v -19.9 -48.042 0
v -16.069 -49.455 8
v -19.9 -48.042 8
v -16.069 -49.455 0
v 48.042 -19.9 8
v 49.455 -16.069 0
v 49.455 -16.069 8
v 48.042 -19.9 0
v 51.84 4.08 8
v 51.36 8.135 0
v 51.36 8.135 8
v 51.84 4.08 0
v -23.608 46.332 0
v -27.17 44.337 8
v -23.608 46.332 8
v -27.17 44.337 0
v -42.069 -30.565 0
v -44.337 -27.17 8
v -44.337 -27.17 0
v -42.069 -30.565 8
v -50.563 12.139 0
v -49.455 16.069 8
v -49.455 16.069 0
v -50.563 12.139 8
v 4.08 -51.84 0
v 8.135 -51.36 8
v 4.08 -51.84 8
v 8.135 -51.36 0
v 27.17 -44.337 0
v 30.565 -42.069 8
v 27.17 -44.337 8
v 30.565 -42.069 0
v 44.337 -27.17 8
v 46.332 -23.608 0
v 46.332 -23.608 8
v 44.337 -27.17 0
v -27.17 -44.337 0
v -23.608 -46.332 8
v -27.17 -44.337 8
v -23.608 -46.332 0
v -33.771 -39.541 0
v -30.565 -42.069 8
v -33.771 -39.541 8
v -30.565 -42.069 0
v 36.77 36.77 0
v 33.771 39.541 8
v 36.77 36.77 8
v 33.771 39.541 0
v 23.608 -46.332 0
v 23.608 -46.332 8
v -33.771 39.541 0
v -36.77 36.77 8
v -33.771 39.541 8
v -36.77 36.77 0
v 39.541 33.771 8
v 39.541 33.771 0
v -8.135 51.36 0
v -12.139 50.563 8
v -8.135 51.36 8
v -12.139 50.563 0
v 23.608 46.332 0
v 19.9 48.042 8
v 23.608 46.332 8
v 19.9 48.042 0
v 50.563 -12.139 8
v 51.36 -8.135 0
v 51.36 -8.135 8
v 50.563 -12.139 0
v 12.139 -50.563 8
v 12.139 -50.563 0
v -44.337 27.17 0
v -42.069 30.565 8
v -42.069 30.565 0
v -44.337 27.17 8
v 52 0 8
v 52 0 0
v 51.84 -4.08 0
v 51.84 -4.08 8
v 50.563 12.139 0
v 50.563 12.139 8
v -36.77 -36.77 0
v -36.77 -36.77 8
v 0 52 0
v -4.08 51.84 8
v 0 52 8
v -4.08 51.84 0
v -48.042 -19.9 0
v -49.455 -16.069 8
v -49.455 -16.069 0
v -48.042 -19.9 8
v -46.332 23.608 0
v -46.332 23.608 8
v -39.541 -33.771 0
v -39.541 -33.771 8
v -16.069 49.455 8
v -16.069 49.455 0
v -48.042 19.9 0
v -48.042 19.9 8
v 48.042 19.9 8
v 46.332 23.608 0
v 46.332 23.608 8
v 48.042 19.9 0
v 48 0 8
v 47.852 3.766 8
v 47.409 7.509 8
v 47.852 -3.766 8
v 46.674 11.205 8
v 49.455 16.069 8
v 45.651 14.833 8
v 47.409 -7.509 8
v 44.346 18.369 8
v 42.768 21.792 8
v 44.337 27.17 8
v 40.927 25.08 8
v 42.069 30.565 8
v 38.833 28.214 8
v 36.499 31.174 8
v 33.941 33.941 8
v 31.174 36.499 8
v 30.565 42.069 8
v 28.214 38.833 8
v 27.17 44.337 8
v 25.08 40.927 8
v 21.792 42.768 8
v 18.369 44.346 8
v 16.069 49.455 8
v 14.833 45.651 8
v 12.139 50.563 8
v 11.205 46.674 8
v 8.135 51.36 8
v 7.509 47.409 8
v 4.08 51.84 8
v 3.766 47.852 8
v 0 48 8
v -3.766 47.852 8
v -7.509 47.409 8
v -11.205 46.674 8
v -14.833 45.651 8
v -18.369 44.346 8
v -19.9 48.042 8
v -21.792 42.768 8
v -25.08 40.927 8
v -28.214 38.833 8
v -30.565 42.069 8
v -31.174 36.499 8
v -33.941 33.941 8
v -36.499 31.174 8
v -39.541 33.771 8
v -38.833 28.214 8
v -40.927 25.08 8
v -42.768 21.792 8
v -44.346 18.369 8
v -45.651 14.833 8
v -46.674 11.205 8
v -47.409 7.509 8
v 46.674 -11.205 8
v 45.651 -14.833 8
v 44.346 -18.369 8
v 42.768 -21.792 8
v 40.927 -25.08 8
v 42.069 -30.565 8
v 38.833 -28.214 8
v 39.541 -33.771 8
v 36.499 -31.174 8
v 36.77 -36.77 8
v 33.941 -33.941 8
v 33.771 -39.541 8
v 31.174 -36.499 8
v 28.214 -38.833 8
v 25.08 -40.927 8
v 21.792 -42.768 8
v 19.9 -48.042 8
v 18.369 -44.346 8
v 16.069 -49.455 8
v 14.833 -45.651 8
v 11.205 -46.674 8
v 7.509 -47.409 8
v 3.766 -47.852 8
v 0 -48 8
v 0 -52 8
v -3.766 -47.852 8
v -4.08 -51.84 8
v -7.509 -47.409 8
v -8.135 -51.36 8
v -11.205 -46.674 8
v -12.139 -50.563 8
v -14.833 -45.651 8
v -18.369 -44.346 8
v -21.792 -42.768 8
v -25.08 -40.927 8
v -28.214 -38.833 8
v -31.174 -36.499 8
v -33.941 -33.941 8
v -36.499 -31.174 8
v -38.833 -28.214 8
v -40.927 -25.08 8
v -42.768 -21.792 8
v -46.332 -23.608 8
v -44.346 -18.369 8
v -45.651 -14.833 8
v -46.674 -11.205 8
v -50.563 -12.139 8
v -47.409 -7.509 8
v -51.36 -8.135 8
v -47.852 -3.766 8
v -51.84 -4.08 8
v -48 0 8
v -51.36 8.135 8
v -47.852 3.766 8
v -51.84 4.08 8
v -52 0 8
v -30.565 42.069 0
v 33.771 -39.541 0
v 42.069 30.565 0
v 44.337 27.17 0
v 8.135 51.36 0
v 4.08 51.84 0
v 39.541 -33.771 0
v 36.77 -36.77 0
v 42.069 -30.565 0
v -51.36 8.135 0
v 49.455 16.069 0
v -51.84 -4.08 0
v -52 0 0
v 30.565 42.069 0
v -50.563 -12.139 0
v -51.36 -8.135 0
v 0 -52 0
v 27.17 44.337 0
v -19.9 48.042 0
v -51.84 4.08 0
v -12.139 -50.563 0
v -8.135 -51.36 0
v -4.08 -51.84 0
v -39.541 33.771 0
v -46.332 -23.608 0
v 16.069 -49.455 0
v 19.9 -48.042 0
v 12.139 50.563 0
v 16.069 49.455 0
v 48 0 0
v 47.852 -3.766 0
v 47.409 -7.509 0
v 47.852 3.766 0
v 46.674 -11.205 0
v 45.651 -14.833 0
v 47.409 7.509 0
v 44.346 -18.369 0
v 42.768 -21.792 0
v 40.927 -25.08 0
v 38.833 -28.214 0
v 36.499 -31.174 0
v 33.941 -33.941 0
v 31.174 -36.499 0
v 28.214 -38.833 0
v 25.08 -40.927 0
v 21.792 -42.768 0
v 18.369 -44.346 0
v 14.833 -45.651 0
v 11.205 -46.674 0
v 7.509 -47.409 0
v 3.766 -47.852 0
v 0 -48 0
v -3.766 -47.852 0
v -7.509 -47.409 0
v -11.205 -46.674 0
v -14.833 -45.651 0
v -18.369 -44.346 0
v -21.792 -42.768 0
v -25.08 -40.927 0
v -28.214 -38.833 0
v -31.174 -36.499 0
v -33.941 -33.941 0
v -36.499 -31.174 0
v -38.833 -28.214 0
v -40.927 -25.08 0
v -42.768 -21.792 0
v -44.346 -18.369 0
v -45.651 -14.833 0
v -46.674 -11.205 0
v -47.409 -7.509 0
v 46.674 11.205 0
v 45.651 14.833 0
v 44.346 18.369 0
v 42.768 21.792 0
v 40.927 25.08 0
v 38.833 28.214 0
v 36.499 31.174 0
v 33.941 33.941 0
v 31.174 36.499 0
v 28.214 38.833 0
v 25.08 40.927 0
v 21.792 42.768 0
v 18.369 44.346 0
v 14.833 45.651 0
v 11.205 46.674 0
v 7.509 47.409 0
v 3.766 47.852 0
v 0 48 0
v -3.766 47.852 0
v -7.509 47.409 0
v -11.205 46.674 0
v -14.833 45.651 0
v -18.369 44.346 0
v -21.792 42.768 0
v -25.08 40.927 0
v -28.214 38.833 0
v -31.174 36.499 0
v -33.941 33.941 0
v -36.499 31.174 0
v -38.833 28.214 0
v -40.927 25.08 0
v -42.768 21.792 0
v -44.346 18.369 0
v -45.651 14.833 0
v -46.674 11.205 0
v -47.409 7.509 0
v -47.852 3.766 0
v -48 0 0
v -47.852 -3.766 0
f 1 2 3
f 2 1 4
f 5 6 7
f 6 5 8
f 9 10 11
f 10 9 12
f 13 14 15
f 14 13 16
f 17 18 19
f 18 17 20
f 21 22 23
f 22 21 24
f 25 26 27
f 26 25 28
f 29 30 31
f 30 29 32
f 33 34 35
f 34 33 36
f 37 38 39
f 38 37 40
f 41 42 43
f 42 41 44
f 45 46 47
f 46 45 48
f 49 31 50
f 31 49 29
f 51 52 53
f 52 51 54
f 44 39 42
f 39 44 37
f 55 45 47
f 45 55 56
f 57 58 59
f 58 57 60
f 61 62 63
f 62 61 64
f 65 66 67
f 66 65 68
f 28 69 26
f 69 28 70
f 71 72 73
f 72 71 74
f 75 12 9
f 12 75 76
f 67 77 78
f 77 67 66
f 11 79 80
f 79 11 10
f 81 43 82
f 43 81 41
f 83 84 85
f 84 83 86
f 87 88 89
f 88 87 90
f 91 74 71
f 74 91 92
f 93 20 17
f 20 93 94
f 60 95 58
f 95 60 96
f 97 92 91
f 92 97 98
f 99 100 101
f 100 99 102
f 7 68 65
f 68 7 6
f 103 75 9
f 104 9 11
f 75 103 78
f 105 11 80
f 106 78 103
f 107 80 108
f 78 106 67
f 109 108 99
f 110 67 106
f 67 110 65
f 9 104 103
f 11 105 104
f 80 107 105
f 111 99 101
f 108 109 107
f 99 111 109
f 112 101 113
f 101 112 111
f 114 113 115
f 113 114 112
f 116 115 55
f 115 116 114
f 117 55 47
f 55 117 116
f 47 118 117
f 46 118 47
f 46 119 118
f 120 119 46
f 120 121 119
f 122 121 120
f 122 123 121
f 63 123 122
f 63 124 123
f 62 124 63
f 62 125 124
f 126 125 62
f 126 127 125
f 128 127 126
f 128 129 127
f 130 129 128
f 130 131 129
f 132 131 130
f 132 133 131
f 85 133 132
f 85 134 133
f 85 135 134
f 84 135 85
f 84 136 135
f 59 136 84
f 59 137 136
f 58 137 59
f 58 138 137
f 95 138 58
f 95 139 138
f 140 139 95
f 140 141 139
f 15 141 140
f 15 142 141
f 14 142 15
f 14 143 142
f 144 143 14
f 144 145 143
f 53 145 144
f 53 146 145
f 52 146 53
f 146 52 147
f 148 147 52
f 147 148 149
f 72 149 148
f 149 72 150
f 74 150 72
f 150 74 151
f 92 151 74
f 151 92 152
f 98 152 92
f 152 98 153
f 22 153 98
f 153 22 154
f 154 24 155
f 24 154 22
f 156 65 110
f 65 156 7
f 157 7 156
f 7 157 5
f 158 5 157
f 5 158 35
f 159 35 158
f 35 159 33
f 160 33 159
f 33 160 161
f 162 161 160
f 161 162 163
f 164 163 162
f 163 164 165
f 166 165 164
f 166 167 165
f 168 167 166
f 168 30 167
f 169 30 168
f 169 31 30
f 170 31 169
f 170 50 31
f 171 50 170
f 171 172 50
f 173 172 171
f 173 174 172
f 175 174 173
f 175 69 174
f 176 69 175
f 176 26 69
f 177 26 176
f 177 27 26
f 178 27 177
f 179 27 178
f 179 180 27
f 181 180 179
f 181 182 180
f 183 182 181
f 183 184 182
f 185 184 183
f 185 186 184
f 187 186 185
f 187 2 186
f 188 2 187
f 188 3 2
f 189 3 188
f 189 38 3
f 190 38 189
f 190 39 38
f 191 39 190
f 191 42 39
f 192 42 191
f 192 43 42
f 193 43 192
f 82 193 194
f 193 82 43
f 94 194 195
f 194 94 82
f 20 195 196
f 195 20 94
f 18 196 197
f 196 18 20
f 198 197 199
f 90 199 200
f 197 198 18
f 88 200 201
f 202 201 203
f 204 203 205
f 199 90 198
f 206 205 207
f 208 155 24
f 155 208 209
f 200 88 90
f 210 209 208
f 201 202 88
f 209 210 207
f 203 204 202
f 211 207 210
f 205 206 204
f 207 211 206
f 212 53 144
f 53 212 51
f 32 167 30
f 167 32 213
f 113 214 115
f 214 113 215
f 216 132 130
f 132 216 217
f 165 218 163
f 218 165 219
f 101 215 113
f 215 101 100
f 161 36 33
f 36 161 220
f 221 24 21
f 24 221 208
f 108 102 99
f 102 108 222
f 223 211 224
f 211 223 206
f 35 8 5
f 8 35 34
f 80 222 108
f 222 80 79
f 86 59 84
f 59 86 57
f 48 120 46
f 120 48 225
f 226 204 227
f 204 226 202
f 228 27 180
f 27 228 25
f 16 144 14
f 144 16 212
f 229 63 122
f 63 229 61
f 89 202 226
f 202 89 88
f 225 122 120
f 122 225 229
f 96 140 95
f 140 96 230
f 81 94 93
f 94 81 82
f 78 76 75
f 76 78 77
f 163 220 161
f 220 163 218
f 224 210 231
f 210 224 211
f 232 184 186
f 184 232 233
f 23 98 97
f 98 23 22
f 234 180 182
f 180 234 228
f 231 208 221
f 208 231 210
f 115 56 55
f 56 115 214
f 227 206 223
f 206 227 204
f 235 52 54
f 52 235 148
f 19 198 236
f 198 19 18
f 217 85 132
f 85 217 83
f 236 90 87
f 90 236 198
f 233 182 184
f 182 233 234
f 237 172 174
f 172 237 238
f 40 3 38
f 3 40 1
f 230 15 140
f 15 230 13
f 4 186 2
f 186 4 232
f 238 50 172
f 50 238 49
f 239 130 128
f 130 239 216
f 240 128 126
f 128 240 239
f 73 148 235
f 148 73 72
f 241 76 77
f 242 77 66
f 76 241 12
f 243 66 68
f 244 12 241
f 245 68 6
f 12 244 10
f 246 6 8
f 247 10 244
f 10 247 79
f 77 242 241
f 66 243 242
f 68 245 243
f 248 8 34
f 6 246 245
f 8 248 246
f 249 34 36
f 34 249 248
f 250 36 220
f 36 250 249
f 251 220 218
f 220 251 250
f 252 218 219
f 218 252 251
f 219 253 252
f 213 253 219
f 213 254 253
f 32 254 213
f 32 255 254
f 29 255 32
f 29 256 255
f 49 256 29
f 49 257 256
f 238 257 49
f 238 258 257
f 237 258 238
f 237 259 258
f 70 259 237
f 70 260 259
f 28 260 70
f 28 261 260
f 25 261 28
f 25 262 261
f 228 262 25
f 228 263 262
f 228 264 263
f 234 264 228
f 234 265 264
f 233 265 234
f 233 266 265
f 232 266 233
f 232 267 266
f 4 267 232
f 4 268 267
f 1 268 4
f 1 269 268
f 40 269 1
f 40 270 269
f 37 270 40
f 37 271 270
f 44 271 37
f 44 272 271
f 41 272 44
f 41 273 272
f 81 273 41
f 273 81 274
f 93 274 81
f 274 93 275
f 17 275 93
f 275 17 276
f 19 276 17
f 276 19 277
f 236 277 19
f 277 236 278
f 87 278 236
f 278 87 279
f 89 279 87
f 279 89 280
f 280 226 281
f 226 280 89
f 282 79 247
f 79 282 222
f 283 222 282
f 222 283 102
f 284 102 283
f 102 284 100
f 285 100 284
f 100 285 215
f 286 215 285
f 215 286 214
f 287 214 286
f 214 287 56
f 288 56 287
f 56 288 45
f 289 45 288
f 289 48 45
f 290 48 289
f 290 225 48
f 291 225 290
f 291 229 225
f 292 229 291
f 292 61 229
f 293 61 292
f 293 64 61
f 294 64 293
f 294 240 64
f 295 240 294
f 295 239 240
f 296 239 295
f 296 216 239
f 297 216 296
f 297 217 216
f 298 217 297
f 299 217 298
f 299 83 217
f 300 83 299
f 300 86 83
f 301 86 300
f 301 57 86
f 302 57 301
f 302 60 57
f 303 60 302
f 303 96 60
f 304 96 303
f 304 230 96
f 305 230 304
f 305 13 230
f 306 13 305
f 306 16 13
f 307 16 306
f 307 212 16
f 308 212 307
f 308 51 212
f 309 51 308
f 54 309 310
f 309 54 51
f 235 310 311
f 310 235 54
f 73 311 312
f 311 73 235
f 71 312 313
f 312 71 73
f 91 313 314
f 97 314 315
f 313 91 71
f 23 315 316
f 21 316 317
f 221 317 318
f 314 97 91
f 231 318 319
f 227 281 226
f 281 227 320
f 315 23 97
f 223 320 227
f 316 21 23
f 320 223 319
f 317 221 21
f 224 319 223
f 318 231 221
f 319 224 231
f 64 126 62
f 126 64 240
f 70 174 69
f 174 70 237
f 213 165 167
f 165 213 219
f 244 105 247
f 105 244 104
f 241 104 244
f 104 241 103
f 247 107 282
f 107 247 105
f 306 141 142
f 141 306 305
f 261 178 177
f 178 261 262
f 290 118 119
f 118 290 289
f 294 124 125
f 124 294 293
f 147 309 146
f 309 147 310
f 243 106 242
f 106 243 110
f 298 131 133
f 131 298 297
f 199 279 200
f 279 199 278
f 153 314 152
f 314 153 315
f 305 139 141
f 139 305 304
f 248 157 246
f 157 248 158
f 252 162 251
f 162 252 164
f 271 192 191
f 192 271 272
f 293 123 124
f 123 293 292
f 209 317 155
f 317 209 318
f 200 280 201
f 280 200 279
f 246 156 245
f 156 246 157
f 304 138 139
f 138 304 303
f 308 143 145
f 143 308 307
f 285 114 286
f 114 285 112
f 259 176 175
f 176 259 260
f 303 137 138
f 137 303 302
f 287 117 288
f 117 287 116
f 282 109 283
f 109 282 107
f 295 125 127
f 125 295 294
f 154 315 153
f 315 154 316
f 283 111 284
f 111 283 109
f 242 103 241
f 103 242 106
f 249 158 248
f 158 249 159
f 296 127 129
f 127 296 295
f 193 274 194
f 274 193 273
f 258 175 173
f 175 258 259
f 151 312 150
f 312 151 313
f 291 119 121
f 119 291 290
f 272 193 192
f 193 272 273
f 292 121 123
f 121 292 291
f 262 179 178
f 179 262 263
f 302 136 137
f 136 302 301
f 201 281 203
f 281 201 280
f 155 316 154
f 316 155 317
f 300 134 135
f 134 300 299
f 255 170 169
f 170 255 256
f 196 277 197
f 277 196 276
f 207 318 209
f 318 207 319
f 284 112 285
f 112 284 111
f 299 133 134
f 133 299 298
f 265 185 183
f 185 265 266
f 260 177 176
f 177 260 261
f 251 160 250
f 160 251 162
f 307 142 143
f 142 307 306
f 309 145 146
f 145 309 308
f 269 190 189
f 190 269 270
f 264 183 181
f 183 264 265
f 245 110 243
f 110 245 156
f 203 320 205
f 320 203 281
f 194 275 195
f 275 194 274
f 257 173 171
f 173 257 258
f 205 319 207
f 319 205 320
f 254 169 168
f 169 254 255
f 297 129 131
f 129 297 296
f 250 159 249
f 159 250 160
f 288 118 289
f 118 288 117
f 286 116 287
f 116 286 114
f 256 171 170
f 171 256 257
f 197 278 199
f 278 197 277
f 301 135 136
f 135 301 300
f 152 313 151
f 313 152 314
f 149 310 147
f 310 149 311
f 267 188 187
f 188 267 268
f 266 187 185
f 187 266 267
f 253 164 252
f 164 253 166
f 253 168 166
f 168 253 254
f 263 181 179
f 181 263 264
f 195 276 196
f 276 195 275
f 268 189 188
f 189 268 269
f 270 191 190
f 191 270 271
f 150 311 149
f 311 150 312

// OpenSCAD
// Pedestal do botão de 100mm (jogador 1 ou 2) — furo no topo pro botão arcade,
// canal interno pra passar o cabo CAT5 até a base do jogo.
//
// Corpo HEXAGONAL com o topo CHANFRADO (bisel de 45°, como uma porca sextavada) —
// forma vem da geometria em si (facetada), sem ícone/símbolo gravado.
//
// *** ATENÇÃO — MEDIDA NÃO CONFIRMADA ***
// Não achei em nenhum fornecedor (NeoDiver, Adafruit, outros) o diâmetro exato do furo
// de instalação desse botão de 100mm — os catálogos só dão o diâmetro da tampa (100mm),
// não o furo do painel. button_hole_d abaixo é uma ESTIMATIVA.
// -> Imprimir primeiro só o módulo `anel_teste()` (rápido, pouco filamento) e encaixar
//    o botão de verdade nele antes de imprimir o pedestal inteiro.

button_hole_d  = 96;   // ESTIMATIVA — ajustar depois de testar com o botão real
wall_t         = 4;
pedestal_h     = 60;   // altura do pedestal até o topo — ajustar quando medir a bancada
wire_channel_d = 10;   // canal central pro cabo CAT5 (8 fios cabem tranquilo em 10mm)

base_plate_h = 6;
hole_d       = 3.2;    // furo M3 pra fixar o pedestal na bancada

// --- Corpo hexagonal: dimensionado pra sobrar parede de verdade mesmo no centro
// de cada face (não só nas quinas) ---
inner_r      = button_hole_d / 2;
apothem      = inner_r + wall_t;                // distância mínima centro->face
hex_d        = apothem * 2 / cos(30);           // diâmetro entre vértices (circunscrito)
apothem_real = hex_d / 2 * cos(30);

base_plate_d = hex_d + 24;                      // base mais larga que o corpo, pra estabilidade
hole_r_pos   = base_plate_d / 2 - 10;

// --- Chanfros (45°) — é isso que dá o "formato", não gravação ---
bevel_top   = 8;   // altura do bisel no topo do corpo hexagonal
bevel_plate = 2.5; // altura do bisel na borda da base

$fn = 80;

module hex_prism(d, h) {
    // rotaciona 30° pra ficar com uma FACE (não uma quina) voltada pro eixo +X
    rotate([0, 0, 30])
        cylinder(d = d, h = h, $fn = 6);
}

// corpo hexagonal com o topo chanfrado a 45°: hull entre o hexágono cheio
// (até a altura h-bevel) e um hexágono menor rente ao topo
module hex_chanfrado(d, h, bevel) {
    shrink = 1 - bevel / apothem_real;   // reduz o diâmetro proporcionalmente ao apótema
    hull() {
        hex_prism(d, h - bevel);
        translate([0, 0, h - bevel])
            hex_prism(d * shrink, 0.01);
    }
}

// disco da base com a borda de cima chanfrada
module disco_chanfrado(d, h, bevel) {
    hull() {
        cylinder(d = d, h = h - bevel);
        translate([0, 0, h - bevel])
            cylinder(d = d - 2*bevel, h = 0.01);
    }
}

module pedestal() {
    union() {
        // base larga, fixada na bancada, com borda chanfrada
        difference() {
            disco_chanfrado(base_plate_d, base_plate_h, bevel_plate);
            translate([0, 0, -1])
                cylinder(d = wire_channel_d, h = base_plate_h + 2);
            for (a = [0, 120, 240])
                rotate([0, 0, a])
                    translate([hole_r_pos, 0, -1])
                        cylinder(d = hole_d, h = base_plate_h + 2);
        }

        // corpo hexagonal do pedestal, topo chanfrado, com furo do botão
        translate([0, 0, base_plate_h])
            difference() {
                hex_chanfrado(hex_d, pedestal_h, bevel_top);
                translate([0, 0, -1])
                    cylinder(d = button_hole_d, h = pedestal_h + 2);
            }
    }
}

// Peça de teste rápida — só um anel fino na altura do furo estimado,
// pra encaixar o botão real e confirmar a medida antes de imprimir o pedestal inteiro.
module anel_teste() {
    difference() {
        cylinder(d = button_hole_d + 2*wall_t, h = 8);
        translate([0, 0, -1])
            cylinder(d = button_hole_d, h = 10);
    }
}

// Descomentar uma linha por vez:
anel_teste();
// pedestal();
